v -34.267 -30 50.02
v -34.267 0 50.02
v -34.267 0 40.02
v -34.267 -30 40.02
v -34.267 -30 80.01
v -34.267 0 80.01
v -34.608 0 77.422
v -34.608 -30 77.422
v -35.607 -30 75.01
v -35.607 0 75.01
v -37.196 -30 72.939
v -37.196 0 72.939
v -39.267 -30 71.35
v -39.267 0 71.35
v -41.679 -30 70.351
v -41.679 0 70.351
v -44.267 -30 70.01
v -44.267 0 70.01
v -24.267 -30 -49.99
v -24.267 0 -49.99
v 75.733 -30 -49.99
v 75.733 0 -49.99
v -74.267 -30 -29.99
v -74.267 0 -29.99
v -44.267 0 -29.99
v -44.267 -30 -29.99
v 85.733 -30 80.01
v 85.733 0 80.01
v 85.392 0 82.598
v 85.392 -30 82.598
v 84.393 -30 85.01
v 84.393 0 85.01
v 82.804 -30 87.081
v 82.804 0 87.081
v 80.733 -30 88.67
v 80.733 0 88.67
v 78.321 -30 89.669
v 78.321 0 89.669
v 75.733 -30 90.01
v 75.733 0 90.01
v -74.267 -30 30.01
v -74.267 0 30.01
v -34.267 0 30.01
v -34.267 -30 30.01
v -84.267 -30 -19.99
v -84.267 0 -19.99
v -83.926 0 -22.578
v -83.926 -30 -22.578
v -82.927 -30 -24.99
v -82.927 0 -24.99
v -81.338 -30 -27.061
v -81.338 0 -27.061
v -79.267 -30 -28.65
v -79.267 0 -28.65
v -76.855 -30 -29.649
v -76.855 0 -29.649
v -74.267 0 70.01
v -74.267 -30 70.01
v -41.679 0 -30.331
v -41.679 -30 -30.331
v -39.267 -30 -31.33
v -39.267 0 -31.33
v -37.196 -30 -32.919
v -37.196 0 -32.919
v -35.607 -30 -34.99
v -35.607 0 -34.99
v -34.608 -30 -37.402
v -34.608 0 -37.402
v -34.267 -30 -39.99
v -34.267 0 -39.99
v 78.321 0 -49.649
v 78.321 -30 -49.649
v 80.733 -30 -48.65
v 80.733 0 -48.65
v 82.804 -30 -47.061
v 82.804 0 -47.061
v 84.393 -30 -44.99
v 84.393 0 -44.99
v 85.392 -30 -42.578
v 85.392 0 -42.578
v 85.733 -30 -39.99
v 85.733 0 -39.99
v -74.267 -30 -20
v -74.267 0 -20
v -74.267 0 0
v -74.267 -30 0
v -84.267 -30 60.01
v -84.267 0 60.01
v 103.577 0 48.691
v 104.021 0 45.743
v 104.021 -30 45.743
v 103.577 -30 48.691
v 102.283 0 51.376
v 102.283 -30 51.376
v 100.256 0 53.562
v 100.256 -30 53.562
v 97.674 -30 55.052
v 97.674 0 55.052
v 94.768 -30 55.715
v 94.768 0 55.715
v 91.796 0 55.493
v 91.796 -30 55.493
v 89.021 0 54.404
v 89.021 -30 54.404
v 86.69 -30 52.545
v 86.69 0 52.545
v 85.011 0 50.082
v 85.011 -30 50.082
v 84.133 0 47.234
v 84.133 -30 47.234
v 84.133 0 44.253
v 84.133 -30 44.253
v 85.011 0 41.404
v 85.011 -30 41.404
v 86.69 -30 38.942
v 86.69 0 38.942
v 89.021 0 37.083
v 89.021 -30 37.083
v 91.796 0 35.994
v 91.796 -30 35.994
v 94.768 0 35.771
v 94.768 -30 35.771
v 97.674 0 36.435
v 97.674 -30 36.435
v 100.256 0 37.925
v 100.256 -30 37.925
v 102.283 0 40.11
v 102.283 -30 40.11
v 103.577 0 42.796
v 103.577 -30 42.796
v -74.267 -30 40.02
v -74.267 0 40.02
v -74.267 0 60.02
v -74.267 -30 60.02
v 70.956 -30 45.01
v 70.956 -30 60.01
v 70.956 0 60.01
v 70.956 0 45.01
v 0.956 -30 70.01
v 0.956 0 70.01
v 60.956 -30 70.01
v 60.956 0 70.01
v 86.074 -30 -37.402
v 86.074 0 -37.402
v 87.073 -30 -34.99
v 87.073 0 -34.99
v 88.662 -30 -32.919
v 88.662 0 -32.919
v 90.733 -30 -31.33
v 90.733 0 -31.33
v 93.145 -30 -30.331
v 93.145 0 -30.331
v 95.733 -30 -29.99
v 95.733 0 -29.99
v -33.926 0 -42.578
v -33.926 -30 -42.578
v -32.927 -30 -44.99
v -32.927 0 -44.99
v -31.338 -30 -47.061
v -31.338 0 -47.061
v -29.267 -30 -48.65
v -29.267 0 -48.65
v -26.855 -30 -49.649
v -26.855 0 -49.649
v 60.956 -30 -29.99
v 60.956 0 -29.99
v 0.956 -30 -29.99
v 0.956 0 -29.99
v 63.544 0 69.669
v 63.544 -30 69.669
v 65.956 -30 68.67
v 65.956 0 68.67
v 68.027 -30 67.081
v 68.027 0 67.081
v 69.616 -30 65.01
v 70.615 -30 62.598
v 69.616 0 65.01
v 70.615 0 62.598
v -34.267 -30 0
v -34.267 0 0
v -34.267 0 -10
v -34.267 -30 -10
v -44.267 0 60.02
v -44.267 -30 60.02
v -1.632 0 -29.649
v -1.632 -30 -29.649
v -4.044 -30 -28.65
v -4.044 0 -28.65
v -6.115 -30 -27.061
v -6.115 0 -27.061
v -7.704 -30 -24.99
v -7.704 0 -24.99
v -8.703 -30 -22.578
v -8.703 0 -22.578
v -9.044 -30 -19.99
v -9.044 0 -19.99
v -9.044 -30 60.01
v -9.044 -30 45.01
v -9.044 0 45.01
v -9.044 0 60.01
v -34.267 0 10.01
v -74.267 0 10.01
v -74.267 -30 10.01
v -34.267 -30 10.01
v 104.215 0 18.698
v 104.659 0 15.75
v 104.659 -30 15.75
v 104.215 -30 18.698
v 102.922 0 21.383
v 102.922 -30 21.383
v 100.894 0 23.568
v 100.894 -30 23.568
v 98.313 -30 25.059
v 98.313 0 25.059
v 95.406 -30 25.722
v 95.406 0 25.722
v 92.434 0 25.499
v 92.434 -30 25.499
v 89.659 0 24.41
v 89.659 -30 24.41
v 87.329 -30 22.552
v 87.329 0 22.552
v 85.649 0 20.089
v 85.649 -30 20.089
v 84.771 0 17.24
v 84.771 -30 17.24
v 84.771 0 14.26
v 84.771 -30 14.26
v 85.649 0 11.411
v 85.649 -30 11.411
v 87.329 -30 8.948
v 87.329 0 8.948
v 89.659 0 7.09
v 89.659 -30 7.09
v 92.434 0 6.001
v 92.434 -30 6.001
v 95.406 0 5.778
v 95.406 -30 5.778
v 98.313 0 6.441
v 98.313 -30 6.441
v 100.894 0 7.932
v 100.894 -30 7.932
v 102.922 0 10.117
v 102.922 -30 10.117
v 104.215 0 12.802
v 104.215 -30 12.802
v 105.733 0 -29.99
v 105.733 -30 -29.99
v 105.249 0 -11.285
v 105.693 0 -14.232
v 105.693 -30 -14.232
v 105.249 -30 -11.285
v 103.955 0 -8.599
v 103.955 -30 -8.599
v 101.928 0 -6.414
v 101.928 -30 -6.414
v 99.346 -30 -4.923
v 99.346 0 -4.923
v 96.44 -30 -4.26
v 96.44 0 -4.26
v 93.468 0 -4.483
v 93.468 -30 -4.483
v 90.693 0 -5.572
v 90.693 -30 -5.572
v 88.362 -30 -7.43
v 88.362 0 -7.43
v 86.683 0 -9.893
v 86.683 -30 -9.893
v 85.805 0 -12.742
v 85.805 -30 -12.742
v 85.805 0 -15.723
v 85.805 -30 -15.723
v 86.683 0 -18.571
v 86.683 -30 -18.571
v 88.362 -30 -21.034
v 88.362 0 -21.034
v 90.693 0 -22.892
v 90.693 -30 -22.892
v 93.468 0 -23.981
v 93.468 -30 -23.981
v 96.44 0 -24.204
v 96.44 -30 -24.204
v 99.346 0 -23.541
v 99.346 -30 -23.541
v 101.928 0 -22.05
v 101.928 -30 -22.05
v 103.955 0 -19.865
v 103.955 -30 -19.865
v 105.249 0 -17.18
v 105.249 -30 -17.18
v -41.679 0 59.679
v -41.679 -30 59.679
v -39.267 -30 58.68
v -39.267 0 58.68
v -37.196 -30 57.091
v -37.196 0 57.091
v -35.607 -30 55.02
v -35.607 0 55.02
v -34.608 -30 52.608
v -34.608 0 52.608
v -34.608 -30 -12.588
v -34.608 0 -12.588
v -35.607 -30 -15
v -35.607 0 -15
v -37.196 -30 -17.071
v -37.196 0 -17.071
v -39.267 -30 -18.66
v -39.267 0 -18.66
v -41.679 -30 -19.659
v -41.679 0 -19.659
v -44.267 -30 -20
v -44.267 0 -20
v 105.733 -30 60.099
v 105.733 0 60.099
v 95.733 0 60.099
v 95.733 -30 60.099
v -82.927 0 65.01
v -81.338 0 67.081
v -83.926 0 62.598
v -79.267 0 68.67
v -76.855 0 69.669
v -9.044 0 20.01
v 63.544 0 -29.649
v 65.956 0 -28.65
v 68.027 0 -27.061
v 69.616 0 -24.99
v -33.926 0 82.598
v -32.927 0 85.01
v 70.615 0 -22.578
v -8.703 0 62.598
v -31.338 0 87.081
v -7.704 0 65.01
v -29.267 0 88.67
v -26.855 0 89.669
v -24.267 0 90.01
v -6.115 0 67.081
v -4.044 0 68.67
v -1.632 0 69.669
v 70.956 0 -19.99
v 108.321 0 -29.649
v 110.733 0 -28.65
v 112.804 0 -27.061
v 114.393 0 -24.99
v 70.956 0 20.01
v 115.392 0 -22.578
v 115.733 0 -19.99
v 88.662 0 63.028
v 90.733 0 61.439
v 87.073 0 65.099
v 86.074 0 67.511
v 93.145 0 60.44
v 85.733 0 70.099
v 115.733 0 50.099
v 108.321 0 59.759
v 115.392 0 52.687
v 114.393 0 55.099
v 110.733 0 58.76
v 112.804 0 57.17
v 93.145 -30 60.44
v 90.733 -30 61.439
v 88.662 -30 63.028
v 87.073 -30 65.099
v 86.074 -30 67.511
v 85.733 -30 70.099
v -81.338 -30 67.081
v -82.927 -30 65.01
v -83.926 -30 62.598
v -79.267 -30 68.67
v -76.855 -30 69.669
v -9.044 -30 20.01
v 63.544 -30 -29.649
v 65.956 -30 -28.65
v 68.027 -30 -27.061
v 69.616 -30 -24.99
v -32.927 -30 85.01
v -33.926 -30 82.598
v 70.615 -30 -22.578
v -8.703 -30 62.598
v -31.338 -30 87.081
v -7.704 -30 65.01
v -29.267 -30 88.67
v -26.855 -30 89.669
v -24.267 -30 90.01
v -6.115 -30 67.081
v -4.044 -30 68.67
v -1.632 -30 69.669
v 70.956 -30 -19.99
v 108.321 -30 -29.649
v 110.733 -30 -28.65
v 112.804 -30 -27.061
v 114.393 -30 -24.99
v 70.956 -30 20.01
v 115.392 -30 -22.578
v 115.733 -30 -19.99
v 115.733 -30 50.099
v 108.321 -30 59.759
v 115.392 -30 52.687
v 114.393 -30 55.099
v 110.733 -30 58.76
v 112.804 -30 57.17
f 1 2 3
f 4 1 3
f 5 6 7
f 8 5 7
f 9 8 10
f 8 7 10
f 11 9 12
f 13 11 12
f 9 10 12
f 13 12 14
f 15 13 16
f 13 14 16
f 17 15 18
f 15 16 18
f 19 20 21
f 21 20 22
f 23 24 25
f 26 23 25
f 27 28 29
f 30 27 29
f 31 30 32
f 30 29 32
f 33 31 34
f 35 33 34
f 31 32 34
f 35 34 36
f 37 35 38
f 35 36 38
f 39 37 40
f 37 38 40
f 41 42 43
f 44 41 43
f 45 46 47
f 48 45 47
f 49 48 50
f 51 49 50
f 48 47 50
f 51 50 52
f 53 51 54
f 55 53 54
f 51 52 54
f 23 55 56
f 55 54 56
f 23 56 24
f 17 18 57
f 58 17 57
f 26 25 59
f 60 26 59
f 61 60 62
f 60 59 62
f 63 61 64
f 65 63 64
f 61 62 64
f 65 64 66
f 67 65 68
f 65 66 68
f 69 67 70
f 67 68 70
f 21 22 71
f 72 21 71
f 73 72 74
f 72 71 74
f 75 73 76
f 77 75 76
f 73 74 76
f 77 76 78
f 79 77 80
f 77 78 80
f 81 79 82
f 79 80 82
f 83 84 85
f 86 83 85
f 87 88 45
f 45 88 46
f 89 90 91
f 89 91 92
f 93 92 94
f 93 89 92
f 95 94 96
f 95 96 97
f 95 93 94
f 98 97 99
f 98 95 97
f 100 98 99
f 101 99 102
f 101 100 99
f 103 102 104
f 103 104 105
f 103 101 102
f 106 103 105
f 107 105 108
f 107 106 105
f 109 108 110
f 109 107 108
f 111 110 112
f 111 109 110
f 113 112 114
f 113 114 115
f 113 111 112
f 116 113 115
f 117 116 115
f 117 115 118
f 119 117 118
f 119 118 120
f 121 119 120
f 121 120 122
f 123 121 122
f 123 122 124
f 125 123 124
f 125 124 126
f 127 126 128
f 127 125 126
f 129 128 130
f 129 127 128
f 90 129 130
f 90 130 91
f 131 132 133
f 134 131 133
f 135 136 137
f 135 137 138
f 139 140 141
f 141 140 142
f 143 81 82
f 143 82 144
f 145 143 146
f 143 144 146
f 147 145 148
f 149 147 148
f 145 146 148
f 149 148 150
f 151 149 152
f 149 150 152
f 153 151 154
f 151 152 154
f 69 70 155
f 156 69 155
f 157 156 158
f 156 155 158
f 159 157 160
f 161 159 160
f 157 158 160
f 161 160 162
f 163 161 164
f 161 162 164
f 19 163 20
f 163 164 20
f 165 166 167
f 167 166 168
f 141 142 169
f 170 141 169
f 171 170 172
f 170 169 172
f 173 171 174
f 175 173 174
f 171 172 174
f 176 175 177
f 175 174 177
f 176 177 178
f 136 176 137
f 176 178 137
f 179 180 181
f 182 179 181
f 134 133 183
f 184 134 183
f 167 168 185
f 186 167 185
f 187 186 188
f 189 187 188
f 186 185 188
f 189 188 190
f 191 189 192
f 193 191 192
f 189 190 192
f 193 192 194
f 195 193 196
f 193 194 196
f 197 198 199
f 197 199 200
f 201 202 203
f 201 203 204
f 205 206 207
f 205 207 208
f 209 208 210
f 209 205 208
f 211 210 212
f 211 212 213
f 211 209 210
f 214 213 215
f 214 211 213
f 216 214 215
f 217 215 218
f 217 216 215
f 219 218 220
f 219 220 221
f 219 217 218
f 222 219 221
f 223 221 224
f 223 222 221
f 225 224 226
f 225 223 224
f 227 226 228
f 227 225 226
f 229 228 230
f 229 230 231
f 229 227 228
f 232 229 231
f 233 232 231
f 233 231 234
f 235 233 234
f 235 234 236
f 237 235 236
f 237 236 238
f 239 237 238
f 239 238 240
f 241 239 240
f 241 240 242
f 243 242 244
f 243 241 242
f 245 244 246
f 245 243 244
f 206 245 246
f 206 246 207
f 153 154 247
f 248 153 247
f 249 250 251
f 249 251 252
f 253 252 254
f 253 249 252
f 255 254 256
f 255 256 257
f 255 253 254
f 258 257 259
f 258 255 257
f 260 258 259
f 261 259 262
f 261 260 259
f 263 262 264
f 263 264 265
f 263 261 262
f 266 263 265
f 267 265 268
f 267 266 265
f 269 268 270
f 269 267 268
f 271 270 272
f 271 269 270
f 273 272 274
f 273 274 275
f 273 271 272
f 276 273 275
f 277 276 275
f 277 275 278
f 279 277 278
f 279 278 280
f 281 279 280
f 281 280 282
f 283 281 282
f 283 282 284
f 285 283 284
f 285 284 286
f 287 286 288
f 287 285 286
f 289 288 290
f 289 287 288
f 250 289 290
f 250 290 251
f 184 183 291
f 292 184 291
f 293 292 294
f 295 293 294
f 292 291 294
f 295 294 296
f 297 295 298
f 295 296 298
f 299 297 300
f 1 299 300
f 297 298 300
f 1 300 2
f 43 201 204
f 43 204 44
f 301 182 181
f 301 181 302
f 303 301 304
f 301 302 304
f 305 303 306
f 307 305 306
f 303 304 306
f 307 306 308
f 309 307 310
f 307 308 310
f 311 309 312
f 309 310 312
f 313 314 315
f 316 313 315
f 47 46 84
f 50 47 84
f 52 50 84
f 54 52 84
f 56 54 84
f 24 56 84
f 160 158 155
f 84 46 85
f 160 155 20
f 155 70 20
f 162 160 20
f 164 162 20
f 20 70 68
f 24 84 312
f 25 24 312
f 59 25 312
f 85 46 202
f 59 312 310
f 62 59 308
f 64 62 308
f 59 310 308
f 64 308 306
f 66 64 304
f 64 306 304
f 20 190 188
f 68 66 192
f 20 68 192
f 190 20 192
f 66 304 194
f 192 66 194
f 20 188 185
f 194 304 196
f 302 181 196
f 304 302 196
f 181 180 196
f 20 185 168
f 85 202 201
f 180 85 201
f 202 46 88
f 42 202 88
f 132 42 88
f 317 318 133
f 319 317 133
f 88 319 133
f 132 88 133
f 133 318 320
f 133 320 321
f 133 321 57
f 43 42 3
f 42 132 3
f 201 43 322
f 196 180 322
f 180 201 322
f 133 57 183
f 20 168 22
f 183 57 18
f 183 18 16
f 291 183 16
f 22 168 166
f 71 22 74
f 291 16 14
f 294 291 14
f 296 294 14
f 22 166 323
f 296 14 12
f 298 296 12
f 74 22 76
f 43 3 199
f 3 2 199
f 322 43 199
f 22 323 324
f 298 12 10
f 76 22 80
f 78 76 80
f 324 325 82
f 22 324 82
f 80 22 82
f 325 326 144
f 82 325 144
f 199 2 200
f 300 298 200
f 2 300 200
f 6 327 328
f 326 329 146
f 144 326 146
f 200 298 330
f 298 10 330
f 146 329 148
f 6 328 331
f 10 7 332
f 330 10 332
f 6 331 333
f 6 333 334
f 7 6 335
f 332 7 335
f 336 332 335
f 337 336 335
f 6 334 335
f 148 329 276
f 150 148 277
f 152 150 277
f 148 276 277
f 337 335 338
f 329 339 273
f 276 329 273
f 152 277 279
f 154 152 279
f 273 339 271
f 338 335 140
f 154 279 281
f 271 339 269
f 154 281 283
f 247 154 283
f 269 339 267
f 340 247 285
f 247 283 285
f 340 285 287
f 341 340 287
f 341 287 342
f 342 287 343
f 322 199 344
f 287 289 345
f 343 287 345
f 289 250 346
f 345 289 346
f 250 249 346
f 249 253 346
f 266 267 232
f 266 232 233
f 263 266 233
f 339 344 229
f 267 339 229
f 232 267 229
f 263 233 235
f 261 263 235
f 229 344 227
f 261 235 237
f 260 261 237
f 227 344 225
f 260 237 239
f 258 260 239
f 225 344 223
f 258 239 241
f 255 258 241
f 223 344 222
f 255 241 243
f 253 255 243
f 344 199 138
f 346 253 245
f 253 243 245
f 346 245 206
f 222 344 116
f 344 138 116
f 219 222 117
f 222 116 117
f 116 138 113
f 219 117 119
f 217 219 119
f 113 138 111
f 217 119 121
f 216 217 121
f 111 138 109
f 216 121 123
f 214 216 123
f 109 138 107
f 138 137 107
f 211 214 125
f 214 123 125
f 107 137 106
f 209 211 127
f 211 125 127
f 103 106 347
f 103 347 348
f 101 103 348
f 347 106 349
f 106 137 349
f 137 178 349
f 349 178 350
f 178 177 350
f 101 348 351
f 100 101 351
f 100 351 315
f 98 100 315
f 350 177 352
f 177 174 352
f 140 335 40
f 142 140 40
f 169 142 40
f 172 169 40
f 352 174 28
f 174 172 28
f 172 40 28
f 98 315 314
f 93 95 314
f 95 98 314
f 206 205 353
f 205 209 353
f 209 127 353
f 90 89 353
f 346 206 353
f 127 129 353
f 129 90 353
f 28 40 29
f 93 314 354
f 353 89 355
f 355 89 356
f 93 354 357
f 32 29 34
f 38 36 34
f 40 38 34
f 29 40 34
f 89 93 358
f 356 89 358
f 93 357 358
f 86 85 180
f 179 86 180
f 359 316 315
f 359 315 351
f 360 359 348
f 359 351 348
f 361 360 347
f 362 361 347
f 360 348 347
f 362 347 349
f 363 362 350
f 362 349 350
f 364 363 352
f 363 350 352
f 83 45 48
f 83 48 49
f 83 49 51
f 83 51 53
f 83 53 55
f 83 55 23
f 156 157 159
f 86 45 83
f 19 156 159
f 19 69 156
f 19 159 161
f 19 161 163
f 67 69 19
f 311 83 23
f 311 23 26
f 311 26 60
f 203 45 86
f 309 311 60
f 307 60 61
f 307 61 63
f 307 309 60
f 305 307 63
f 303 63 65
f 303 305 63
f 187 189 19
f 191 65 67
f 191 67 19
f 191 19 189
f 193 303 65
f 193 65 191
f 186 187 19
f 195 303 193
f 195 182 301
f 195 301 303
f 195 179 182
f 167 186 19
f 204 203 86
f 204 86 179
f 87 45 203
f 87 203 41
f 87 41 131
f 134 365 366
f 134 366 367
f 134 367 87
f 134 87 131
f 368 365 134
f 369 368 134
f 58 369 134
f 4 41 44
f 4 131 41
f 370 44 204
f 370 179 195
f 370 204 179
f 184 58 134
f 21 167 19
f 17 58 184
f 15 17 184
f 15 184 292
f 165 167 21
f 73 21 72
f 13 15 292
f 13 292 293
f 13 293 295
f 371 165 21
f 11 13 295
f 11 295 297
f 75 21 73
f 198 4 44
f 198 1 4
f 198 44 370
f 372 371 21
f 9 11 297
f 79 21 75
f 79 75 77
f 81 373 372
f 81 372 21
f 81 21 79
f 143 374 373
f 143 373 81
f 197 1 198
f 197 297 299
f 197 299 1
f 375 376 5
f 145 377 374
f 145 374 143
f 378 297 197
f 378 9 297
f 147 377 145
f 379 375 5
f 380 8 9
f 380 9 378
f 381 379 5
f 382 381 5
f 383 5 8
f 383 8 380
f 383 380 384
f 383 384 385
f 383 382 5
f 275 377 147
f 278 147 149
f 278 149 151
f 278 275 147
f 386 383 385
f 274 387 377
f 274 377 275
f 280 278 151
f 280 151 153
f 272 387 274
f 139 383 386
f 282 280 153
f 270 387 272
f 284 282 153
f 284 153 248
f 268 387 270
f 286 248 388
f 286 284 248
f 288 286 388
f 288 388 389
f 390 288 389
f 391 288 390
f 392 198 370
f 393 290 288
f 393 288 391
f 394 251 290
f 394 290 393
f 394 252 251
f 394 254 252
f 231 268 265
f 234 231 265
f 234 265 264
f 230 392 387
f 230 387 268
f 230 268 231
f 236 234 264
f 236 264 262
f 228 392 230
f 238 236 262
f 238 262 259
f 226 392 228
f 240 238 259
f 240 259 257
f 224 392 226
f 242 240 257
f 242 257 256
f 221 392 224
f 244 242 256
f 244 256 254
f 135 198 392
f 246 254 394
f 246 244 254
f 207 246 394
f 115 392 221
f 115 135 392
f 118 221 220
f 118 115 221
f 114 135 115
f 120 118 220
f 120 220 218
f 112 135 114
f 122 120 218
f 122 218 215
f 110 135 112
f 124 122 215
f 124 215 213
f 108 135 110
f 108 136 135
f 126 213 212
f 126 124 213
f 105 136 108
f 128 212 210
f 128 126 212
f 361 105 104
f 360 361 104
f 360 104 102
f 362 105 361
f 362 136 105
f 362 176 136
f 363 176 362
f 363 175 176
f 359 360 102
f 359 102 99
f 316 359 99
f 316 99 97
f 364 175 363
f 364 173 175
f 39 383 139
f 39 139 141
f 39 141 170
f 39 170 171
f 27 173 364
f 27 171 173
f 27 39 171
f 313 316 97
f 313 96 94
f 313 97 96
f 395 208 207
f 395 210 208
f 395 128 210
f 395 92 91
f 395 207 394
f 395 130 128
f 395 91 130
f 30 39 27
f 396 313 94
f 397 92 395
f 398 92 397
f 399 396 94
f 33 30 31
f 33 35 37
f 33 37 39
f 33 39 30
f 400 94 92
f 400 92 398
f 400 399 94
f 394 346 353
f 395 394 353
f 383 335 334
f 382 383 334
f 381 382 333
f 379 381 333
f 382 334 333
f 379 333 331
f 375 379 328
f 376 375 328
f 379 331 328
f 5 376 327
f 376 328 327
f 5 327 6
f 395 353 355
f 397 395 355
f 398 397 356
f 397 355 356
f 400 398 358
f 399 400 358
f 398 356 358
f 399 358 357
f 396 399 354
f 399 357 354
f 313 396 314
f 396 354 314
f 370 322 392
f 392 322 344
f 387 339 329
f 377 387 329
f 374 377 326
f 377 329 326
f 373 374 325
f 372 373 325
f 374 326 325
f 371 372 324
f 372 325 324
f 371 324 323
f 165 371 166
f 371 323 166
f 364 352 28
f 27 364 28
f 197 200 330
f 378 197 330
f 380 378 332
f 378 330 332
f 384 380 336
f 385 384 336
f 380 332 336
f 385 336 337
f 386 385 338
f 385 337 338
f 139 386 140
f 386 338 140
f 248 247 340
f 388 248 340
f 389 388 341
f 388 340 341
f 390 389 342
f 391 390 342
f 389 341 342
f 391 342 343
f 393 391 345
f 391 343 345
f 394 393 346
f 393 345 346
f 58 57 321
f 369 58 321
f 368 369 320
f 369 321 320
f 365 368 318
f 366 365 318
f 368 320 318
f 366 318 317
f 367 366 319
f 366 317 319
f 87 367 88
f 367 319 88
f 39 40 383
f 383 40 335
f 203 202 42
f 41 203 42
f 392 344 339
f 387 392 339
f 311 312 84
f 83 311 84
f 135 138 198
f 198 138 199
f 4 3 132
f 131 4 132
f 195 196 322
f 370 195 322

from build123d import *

# Parameters (mm, degrees)
F0_R     = 10
F0_W     = 40
F0_H     = 20
F1_DEPTH = 30


with BuildPart() as f1:
    # F0 (on Front) → F1 (new body)
    with BuildSketch(Plane.XZ):
        with BuildLine():
            Line((75.732799, 90.009839), (-24.267201, 90.009839))
            ThreePointArc((-24.267201, 90.009839), (-31.338269, 87.080907), (-34.267201, 80.009839))
            ThreePointArc((-34.267201, 80.009839), (-37.196133, 72.938771), (-44.267201, 70.009839))
            Line((-44.267201, 70.009839), (-74.267201, 70.009839))
            ThreePointArc((-74.267201, 70.009839), (-81.338269, 67.080907), (-84.267201, 60.009839))
            Line((-84.267201, 60.009839), (-84.267201, -19.990161))
            ThreePointArc((-84.267201, -19.990161), (-81.338269, -27.061229), (-74.267201, -29.990161))
            Line((-74.267201, -29.990161), (-44.267201, -29.990161))
            ThreePointArc((-44.267201, -29.990161), (-37.196133, -32.919093), (-34.267201, -39.990161))
            ThreePointArc((-34.267201, -39.990161), (-31.338269, -47.061229), (-24.267201, -49.990161))
            Line((-24.267201, -49.990161), (75.732799, -49.990161))
            ThreePointArc((75.732799, -49.990161), (82.803867, -47.061229), (85.732799, -39.990161))
            ThreePointArc((85.732799, -39.990161), (88.661731, -32.919093), (95.732799, -29.990161))
            Line((95.732799, -29.990161), (105.732799, -29.990161))
            ThreePointArc((105.732799, -29.990161), (112.803867, -27.061229), (115.732799, -19.990161))
            Line((115.732799, -19.990161), (115.732799, 50.099277))
            ThreePointArc((115.732799, 50.099277), (112.803867, 57.170345), (105.732799, 60.099277))
            Line((105.732799, 60.099277), (95.732799, 60.099277))
            ThreePointArc((95.732799, 60.099277), (88.661731, 63.028209), (85.732799, 70.099277))
            Line((85.732799, 70.099277), (85.732799, 80.009839))
            ThreePointArc((85.732799, 80.009839), (82.803867, 87.080907), (75.732799, 90.009839))
        make_face()
        with BuildLine():
            Line((-44.267201, -20), (-74.267201, -20))
            Line((-74.267201, -20), (-74.267201, 0))
            Line((-74.267201, 0), (-34.267201, 0))
            Line((-34.267201, 0), (-34.267201, -10))
            ThreePointArc((-34.267201, -10), (-37.196133, -17.071068), (-44.267201, -20))
        make_face(mode=Mode.SUBTRACT)
        with BuildLine():
            ThreePointArc((70.956033, -19.990161), (68.0271, -27.061229), (60.956033, -29.990161))
            Line((60.956033, -29.990161), (0.956033, -29.990161))
            ThreePointArc((0.956033, -29.990161), (-6.115035, -27.061229), (-9.043967, -19.990161))
            Line((-9.043967, -19.990161), (-9.043967, 20.009839))
            Line((-9.043967, 20.009839), (70.956033, 20.009839))
            Line((70.956033, 20.009839), (70.956033, -19.990161))
        make_face(mode=Mode.SUBTRACT)
        with Locations((95.693012, -14.23213)):
            Circle(F0_R, mode=Mode.SUBTRACT)
        with Locations((94.65915, 15.750051)):
            Circle(F0_R, mode=Mode.SUBTRACT)
        with Locations((-54.267201, 20.009839)):
            Rectangle(F0_W, F0_H, mode=Mode.SUBTRACT)
        with BuildLine():
            Line((-74.267201, 40.019678), (-74.267201, 60.019678))
            Line((-74.267201, 60.019678), (-44.267201, 60.019678))
            ThreePointArc((-44.267201, 60.019678), (-37.196133, 57.090745), (-34.267201, 50.019678))
            Line((-34.267201, 50.019678), (-34.267201, 40.019678))
            Line((-34.267201, 40.019678), (-74.267201, 40.019678))
        make_face(mode=Mode.SUBTRACT)
        with Locations((94.02099, 45.743262)):
            Circle(F0_R, mode=Mode.SUBTRACT)
        with BuildLine():
            ThreePointArc((-9.043967, 60.009839), (-6.115035, 67.080907), (0.956033, 70.009839))
            Line((0.956033, 70.009839), (60.956033, 70.009839))
            ThreePointArc((60.956033, 70.009839), (68.0271, 67.080907), (70.956033, 60.009839))
            Line((70.956033, 60.009839), (70.956033, 45.009839))
            Line((70.956033, 45.009839), (-9.043967, 45.009839))
            Line((-9.043967, 45.009839), (-9.043967, 60.009839))
        make_face(mode=Mode.SUBTRACT)
    extrude(amount=F1_DEPTH)


solid = f1.part
